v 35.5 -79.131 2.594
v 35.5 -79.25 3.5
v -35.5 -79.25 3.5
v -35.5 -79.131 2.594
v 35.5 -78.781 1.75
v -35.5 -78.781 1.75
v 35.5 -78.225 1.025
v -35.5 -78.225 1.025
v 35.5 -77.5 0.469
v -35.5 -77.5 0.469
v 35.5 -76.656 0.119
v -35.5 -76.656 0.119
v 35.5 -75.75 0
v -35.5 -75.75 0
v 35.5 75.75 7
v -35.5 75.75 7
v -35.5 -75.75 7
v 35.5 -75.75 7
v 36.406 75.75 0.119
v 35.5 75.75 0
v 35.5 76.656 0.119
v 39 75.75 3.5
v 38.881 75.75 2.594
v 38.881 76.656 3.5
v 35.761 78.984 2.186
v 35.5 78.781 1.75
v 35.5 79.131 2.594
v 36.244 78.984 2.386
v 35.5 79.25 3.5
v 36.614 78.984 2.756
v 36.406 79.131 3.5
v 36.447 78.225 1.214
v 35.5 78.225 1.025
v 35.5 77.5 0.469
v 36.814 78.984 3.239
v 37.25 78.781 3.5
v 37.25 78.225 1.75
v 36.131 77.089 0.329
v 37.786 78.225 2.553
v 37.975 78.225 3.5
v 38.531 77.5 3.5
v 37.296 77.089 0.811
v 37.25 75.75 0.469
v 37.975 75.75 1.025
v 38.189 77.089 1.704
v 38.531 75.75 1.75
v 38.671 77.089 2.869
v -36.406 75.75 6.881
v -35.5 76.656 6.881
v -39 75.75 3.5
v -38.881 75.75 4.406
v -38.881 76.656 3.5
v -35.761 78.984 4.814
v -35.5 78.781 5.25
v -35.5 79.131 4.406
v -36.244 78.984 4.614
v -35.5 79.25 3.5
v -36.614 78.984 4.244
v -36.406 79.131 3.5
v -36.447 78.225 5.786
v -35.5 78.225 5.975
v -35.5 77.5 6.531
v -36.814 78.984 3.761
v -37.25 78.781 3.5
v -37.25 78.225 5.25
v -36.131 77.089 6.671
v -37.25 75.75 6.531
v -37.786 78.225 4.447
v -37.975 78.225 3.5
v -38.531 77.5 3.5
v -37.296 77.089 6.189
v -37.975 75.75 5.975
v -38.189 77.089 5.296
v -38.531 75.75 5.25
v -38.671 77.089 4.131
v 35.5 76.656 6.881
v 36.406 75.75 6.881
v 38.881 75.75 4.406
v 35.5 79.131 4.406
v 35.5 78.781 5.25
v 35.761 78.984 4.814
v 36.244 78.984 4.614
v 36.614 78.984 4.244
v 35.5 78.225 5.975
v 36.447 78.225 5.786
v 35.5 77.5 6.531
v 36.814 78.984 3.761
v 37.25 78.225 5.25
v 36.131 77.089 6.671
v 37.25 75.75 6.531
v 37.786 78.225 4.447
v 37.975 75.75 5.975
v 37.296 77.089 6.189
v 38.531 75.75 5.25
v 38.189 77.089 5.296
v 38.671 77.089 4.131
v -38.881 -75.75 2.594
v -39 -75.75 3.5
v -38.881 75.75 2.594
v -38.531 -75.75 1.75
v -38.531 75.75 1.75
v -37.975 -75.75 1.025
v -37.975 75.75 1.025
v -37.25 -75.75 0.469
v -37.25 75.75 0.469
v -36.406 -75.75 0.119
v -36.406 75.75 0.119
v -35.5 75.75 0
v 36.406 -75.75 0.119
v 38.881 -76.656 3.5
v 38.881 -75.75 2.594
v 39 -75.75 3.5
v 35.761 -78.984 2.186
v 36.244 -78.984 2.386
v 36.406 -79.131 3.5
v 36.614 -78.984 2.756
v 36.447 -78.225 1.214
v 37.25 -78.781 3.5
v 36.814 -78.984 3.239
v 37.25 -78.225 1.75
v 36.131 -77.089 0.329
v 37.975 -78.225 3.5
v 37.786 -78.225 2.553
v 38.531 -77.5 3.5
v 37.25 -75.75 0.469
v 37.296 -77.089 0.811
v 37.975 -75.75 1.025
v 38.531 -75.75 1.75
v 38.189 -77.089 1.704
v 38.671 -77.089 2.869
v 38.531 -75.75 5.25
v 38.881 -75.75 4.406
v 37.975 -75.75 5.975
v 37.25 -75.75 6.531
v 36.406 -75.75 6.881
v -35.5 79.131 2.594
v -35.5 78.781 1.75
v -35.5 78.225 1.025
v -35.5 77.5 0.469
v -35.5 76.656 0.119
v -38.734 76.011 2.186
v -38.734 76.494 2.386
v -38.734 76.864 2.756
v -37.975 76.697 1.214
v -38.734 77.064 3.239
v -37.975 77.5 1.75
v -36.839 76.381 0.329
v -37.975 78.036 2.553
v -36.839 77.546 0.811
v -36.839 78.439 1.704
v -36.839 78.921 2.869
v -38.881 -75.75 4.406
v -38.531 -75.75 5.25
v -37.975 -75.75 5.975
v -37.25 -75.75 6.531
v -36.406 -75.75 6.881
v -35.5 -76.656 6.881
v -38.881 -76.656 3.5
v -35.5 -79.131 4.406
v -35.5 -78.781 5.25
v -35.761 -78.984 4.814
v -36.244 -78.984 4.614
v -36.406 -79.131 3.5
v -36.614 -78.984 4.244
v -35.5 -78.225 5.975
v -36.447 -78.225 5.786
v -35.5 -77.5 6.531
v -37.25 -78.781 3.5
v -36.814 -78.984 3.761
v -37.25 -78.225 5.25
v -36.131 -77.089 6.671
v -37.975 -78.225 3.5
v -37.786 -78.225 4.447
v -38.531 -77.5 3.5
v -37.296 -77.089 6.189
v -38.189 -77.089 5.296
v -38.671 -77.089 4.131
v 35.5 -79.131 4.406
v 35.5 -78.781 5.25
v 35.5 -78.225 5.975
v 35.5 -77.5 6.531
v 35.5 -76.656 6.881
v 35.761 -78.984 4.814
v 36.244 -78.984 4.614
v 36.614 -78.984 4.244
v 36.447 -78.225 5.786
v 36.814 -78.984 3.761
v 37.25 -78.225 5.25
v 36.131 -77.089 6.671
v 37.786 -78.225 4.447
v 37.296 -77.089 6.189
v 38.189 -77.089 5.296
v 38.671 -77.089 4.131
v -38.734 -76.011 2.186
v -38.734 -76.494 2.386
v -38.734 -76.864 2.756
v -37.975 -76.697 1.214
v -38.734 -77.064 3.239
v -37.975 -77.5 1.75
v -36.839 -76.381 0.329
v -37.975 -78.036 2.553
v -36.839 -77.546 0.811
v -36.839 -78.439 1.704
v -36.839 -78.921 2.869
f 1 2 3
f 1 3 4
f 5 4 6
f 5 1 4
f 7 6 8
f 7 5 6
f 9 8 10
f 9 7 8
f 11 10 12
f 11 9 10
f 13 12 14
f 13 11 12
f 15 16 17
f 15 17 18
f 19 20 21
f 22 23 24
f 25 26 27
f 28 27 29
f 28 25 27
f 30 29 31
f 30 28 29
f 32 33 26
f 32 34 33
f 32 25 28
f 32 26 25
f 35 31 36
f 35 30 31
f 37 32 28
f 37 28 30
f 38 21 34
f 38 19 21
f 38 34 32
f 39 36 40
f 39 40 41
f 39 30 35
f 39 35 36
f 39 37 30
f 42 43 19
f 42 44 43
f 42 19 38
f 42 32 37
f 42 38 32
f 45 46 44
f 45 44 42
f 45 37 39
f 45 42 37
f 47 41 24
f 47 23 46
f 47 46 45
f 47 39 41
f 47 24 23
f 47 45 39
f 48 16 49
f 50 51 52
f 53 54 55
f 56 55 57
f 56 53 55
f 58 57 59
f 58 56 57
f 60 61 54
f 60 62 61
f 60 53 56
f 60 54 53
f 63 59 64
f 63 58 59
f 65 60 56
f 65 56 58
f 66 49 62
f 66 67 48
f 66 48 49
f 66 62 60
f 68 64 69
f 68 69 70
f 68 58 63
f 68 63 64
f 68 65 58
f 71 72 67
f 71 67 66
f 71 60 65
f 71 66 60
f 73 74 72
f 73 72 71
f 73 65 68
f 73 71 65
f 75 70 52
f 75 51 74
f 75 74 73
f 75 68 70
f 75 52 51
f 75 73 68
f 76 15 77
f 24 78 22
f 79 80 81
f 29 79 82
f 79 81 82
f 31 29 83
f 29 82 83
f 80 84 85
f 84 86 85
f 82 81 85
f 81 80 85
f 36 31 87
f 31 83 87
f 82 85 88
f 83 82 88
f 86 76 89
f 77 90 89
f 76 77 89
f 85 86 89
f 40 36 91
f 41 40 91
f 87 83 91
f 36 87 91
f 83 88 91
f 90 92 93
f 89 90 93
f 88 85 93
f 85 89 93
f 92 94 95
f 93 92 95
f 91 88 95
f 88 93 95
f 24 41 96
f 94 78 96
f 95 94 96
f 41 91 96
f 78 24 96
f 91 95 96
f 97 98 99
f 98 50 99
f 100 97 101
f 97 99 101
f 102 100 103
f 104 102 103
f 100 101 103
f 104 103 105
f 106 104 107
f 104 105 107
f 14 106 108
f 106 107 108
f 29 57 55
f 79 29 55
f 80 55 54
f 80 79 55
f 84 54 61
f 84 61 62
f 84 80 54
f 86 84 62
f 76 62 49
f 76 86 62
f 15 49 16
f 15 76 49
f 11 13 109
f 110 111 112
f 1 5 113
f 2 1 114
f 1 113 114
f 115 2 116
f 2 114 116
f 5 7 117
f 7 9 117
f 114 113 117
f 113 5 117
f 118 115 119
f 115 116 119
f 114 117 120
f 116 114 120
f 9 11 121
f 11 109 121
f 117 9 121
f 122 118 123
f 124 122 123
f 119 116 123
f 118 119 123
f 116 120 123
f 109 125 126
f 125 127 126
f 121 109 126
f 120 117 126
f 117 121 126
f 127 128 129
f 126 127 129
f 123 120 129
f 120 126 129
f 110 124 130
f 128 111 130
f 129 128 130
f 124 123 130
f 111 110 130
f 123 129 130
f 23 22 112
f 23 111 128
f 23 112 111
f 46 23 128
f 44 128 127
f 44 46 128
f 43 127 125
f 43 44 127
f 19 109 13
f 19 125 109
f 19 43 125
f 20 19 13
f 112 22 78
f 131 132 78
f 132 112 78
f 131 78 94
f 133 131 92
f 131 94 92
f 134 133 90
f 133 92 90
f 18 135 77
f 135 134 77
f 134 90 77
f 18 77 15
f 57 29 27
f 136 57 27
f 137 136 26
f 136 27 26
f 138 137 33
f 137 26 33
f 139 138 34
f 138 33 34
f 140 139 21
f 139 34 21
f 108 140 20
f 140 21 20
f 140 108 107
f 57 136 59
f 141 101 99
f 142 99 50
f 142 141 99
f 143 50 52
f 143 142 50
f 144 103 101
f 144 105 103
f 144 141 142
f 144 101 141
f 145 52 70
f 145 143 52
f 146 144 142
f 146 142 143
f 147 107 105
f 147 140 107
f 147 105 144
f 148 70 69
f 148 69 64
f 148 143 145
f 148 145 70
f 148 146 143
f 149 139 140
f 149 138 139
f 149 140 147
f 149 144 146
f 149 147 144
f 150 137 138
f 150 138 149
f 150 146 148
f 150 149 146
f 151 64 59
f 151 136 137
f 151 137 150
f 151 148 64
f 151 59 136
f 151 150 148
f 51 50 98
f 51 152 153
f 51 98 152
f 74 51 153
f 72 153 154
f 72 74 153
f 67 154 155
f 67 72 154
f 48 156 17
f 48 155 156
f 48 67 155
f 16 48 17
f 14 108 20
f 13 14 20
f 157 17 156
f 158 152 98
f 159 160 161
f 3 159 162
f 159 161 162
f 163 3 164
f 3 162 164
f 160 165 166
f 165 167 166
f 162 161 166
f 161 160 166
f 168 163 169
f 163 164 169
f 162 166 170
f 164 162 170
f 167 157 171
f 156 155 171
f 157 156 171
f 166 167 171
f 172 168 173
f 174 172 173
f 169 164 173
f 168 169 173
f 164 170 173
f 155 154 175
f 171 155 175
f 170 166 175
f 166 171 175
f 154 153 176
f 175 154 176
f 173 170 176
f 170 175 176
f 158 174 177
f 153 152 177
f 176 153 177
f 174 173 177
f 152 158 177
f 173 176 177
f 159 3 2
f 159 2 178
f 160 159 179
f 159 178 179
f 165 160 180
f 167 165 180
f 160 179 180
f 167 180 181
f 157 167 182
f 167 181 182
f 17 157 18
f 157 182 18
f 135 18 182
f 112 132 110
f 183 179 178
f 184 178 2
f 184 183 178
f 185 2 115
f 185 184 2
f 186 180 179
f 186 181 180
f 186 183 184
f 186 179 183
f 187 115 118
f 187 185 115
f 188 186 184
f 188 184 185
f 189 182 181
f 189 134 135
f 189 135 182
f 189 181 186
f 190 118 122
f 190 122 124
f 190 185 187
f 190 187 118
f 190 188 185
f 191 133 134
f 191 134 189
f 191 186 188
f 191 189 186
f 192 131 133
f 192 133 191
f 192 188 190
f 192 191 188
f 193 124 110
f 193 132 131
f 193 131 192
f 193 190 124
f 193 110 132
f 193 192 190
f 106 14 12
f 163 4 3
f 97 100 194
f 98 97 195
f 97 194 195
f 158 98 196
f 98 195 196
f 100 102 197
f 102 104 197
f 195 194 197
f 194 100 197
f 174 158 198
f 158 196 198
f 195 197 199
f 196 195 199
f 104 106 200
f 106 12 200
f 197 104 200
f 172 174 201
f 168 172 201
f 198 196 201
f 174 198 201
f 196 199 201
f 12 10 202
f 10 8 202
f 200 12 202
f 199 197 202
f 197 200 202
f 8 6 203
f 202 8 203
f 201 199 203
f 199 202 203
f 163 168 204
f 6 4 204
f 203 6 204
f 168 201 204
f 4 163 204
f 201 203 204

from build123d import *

# Parameters (mm, degrees)
F0_W     = 78
F0_H     = 158.5
F0_R     = 5.75
F0_R_2   = 0.75
F0_W_2   = 14
F0_H_2   = 1
F0_W_3   = 22
F0_H_3   = 12
F1_DEPTH = 7
F2_R     = 3.49999


# Not quite as in the source:
# - a fillet or chamfer is up to 0.001 mm smaller than in the source, because OpenCascade refuses the exact size


with BuildPart() as f1:
    # F0 (on Top) → F1 (new body)
    with BuildSketch(Plane.XY):
        Rectangle(F0_W, F0_H)
        with Locations((0, -69.5)):
            Circle(F0_R, mode=Mode.SUBTRACT)
        with Locations((-13.75, 69.75)):
            Circle(F0_R_2, mode=Mode.SUBTRACT)
        with Locations((0, 69.75)):
            Rectangle(F0_W_2, F0_H_2, mode=Mode.SUBTRACT)
        with Locations((22.5, 67.75)):
            Rectangle(F0_W_3, F0_H_3, mode=Mode.SUBTRACT)
        with Locations((0, -69.5)):
            Circle(F0_R)
        with Locations((22.5, 67.75)):
            Rectangle(F0_W_3, F0_H_3)
        with Locations((0, 69.75)):
            Rectangle(F0_W_2, F0_H_2)
        with Locations((-13.75, 69.75)):
            Circle(F0_R_2)
    extrude(amount=F1_DEPTH)

    # F2 (radius 3.5 in the source; OpenCascade refuses exactly that, so slightly less here)
    f2_edges = [f1.edges().sort_by_distance(p)[0] for p in [
        (39, 0, 7),
        (-39, 0, 7),
        (0, -79.25, 7),
        (0, 79.25, 7),
        (39, 0, 0),
        (0, -79.25, 0),
        (0, 79.25, 0),
        (-39, 0, 0),
        (-39, 79.25, 3.5),
        (39, 79.25, 3.5),
        (-39, -79.25, 3.5),
        (39, -79.25, 3.5),
    ]]
    fillet(f2_edges, radius=F2_R)


solid = f1.part
